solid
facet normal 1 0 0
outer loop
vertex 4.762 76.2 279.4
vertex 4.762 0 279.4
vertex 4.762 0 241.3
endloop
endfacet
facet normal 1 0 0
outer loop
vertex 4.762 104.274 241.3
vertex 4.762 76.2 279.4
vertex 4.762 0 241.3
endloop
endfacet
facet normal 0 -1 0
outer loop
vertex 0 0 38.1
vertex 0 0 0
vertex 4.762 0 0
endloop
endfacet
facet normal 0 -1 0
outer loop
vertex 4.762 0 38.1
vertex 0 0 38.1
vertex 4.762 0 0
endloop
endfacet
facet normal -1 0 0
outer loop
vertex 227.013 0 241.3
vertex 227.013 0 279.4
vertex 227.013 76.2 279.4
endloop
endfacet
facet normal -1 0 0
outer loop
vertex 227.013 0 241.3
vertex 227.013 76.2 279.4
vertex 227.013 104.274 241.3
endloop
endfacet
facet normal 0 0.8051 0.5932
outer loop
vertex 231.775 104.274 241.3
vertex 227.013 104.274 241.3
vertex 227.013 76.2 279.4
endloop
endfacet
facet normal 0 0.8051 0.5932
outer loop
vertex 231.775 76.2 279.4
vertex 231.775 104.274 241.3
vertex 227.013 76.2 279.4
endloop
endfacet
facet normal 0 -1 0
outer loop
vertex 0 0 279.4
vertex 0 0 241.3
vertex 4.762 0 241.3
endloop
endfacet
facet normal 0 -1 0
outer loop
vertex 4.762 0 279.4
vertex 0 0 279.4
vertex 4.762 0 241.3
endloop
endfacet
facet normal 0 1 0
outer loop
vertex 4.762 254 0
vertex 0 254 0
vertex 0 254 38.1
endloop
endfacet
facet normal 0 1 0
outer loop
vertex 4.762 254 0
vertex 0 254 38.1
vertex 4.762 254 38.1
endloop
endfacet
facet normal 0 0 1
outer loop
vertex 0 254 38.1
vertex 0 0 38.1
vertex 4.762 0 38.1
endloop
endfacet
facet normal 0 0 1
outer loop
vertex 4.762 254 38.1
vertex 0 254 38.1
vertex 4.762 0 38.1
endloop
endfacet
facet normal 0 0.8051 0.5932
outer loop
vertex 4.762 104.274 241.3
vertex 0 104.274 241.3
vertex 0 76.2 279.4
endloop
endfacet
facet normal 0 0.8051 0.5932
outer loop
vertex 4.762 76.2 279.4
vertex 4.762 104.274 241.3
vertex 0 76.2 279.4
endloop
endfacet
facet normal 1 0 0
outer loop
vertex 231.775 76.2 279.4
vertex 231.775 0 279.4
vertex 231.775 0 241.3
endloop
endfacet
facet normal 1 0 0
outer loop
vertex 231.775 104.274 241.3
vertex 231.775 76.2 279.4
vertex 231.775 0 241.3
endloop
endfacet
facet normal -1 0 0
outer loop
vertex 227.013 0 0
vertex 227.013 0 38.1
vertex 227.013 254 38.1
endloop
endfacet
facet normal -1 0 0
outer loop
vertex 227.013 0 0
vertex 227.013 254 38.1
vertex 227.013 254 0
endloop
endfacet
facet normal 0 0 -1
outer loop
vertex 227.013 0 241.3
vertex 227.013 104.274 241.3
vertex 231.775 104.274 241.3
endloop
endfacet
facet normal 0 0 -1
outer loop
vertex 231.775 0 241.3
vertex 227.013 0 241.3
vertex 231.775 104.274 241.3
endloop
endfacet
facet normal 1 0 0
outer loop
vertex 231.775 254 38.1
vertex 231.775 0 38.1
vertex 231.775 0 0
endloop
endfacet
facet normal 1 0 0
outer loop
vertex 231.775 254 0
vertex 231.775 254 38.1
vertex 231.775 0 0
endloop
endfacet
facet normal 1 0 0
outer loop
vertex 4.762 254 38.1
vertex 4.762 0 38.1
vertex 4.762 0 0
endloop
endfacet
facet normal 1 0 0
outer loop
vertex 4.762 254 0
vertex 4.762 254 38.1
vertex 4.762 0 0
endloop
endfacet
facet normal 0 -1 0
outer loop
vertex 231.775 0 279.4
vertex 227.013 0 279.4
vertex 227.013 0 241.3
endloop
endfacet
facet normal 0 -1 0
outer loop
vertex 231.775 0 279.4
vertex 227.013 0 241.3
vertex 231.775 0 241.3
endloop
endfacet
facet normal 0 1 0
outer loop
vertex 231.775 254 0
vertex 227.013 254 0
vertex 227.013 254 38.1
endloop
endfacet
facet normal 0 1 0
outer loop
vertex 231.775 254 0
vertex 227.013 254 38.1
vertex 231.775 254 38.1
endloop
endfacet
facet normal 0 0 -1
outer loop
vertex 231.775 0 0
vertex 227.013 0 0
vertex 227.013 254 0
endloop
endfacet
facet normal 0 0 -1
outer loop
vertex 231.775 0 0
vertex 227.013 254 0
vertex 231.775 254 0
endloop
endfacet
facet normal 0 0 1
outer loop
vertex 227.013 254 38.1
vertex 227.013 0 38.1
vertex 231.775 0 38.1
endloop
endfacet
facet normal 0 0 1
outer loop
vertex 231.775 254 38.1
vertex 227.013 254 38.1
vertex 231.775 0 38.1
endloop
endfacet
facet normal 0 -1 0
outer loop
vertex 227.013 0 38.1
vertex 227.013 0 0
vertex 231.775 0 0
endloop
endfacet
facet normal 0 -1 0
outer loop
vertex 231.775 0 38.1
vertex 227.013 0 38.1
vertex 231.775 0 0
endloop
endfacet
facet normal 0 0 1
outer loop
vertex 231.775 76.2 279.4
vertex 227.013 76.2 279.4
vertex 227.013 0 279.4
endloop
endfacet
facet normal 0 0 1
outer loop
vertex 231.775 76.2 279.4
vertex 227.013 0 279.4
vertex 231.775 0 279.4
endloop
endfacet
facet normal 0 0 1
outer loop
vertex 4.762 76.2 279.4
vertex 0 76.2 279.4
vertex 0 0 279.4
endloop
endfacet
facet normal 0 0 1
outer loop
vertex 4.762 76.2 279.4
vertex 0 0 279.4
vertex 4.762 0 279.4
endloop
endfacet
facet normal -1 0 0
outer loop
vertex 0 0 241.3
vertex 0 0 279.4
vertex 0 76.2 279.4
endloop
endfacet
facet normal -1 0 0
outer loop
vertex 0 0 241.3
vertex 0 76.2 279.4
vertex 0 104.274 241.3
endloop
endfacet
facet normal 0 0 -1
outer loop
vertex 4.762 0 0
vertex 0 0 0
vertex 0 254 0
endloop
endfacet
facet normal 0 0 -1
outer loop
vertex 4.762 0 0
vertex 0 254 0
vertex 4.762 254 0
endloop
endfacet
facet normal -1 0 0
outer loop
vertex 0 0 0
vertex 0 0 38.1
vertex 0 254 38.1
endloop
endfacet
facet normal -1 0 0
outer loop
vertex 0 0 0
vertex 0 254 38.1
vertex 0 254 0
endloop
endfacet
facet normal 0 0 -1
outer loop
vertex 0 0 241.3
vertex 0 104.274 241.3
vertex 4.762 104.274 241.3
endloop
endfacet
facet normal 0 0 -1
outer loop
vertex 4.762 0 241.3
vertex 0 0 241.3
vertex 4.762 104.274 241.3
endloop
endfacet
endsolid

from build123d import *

# Parameters (mm, degrees)
SKETCH2_W             = 4.7625
SKETCH2_H             = 38.1
BOSS_EXTRUDE1_DEPTH   = 254
BOSS_EXTRUDE1_2_DEPTH = 254
BOSS_EXTRUDE1_3_DEPTH = 254
BOSS_EXTRUDE1_4_DEPTH = 254
CUT_EXTRUDE3_DEPTH    = 444.057570328


with BuildPart() as part:
    # Sketch2 → Boss-Extrude1 (new body)
    with BuildSketch(Plane(origin=(0, 0, 0), x_dir=(1, 0, 0), z_dir=(0, 1, 0))):
        with Locations((2.38125, -19.05)):
            Rectangle(SKETCH2_W, SKETCH2_H)
    extrude(amount=BOSS_EXTRUDE1_DEPTH)


with BuildPart() as body_2:
    # Sketch2 → Boss-Extrude1 2 (new body)
    with BuildSketch(Plane(origin=(0, 0, 0), x_dir=(1, 0, 0), z_dir=(0, 1, 0))):
        with Locations((229.39375, -19.05)):
            Rectangle(SKETCH2_W, SKETCH2_H)
    extrude(amount=BOSS_EXTRUDE1_2_DEPTH)


with BuildPart() as body_3:
    # Sketch2 → Boss-Extrude1 3 (new body)
    with BuildSketch(Plane(origin=(0, 0, 0), x_dir=(1, 0, 0), z_dir=(0, 1, 0))):
        with Locations((2.38125, -260.35)):
            Rectangle(SKETCH2_W, SKETCH2_H)
    extrude(amount=BOSS_EXTRUDE1_3_DEPTH)


with BuildPart() as body_4:
    # Sketch2 → Boss-Extrude1 4 (new body)
    with BuildSketch(Plane(origin=(0, 0, 0), x_dir=(1, 0, 0), z_dir=(0, 1, 0))):
        with Locations((229.39375, -260.35)):
            Rectangle(SKETCH2_W, SKETCH2_H)
    extrude(amount=BOSS_EXTRUDE1_4_DEPTH)


with BuildPart() as cut_extrude3_tool:
    # Sketch3 → Cut-Extrude3 (new, through all)
    with BuildSketch(Plane(origin=(0, 0, 0), x_dir=(0, 0, -1), z_dir=(1, 0, 0))):
        Polygon((-279.4, 76.2), (-279.4, 254), (-38.1, 254), align=None)
    extrude(amount=CUT_EXTRUDE3_DEPTH)


with BuildPart() as body_3_1:
    add(body_3.part)

    # Cut-Extrude3: cut by cut_extrude3_tool
    add(cut_extrude3_tool.part, mode=Mode.SUBTRACT)


with BuildPart() as body_4_1:
    add(body_4.part)

    # Cut-Extrude3: cut by cut_extrude3_tool
    add(cut_extrude3_tool.part, mode=Mode.SUBTRACT)


solid = Compound([part.part, body_2.part, body_3_1.part, body_4_1.part])
